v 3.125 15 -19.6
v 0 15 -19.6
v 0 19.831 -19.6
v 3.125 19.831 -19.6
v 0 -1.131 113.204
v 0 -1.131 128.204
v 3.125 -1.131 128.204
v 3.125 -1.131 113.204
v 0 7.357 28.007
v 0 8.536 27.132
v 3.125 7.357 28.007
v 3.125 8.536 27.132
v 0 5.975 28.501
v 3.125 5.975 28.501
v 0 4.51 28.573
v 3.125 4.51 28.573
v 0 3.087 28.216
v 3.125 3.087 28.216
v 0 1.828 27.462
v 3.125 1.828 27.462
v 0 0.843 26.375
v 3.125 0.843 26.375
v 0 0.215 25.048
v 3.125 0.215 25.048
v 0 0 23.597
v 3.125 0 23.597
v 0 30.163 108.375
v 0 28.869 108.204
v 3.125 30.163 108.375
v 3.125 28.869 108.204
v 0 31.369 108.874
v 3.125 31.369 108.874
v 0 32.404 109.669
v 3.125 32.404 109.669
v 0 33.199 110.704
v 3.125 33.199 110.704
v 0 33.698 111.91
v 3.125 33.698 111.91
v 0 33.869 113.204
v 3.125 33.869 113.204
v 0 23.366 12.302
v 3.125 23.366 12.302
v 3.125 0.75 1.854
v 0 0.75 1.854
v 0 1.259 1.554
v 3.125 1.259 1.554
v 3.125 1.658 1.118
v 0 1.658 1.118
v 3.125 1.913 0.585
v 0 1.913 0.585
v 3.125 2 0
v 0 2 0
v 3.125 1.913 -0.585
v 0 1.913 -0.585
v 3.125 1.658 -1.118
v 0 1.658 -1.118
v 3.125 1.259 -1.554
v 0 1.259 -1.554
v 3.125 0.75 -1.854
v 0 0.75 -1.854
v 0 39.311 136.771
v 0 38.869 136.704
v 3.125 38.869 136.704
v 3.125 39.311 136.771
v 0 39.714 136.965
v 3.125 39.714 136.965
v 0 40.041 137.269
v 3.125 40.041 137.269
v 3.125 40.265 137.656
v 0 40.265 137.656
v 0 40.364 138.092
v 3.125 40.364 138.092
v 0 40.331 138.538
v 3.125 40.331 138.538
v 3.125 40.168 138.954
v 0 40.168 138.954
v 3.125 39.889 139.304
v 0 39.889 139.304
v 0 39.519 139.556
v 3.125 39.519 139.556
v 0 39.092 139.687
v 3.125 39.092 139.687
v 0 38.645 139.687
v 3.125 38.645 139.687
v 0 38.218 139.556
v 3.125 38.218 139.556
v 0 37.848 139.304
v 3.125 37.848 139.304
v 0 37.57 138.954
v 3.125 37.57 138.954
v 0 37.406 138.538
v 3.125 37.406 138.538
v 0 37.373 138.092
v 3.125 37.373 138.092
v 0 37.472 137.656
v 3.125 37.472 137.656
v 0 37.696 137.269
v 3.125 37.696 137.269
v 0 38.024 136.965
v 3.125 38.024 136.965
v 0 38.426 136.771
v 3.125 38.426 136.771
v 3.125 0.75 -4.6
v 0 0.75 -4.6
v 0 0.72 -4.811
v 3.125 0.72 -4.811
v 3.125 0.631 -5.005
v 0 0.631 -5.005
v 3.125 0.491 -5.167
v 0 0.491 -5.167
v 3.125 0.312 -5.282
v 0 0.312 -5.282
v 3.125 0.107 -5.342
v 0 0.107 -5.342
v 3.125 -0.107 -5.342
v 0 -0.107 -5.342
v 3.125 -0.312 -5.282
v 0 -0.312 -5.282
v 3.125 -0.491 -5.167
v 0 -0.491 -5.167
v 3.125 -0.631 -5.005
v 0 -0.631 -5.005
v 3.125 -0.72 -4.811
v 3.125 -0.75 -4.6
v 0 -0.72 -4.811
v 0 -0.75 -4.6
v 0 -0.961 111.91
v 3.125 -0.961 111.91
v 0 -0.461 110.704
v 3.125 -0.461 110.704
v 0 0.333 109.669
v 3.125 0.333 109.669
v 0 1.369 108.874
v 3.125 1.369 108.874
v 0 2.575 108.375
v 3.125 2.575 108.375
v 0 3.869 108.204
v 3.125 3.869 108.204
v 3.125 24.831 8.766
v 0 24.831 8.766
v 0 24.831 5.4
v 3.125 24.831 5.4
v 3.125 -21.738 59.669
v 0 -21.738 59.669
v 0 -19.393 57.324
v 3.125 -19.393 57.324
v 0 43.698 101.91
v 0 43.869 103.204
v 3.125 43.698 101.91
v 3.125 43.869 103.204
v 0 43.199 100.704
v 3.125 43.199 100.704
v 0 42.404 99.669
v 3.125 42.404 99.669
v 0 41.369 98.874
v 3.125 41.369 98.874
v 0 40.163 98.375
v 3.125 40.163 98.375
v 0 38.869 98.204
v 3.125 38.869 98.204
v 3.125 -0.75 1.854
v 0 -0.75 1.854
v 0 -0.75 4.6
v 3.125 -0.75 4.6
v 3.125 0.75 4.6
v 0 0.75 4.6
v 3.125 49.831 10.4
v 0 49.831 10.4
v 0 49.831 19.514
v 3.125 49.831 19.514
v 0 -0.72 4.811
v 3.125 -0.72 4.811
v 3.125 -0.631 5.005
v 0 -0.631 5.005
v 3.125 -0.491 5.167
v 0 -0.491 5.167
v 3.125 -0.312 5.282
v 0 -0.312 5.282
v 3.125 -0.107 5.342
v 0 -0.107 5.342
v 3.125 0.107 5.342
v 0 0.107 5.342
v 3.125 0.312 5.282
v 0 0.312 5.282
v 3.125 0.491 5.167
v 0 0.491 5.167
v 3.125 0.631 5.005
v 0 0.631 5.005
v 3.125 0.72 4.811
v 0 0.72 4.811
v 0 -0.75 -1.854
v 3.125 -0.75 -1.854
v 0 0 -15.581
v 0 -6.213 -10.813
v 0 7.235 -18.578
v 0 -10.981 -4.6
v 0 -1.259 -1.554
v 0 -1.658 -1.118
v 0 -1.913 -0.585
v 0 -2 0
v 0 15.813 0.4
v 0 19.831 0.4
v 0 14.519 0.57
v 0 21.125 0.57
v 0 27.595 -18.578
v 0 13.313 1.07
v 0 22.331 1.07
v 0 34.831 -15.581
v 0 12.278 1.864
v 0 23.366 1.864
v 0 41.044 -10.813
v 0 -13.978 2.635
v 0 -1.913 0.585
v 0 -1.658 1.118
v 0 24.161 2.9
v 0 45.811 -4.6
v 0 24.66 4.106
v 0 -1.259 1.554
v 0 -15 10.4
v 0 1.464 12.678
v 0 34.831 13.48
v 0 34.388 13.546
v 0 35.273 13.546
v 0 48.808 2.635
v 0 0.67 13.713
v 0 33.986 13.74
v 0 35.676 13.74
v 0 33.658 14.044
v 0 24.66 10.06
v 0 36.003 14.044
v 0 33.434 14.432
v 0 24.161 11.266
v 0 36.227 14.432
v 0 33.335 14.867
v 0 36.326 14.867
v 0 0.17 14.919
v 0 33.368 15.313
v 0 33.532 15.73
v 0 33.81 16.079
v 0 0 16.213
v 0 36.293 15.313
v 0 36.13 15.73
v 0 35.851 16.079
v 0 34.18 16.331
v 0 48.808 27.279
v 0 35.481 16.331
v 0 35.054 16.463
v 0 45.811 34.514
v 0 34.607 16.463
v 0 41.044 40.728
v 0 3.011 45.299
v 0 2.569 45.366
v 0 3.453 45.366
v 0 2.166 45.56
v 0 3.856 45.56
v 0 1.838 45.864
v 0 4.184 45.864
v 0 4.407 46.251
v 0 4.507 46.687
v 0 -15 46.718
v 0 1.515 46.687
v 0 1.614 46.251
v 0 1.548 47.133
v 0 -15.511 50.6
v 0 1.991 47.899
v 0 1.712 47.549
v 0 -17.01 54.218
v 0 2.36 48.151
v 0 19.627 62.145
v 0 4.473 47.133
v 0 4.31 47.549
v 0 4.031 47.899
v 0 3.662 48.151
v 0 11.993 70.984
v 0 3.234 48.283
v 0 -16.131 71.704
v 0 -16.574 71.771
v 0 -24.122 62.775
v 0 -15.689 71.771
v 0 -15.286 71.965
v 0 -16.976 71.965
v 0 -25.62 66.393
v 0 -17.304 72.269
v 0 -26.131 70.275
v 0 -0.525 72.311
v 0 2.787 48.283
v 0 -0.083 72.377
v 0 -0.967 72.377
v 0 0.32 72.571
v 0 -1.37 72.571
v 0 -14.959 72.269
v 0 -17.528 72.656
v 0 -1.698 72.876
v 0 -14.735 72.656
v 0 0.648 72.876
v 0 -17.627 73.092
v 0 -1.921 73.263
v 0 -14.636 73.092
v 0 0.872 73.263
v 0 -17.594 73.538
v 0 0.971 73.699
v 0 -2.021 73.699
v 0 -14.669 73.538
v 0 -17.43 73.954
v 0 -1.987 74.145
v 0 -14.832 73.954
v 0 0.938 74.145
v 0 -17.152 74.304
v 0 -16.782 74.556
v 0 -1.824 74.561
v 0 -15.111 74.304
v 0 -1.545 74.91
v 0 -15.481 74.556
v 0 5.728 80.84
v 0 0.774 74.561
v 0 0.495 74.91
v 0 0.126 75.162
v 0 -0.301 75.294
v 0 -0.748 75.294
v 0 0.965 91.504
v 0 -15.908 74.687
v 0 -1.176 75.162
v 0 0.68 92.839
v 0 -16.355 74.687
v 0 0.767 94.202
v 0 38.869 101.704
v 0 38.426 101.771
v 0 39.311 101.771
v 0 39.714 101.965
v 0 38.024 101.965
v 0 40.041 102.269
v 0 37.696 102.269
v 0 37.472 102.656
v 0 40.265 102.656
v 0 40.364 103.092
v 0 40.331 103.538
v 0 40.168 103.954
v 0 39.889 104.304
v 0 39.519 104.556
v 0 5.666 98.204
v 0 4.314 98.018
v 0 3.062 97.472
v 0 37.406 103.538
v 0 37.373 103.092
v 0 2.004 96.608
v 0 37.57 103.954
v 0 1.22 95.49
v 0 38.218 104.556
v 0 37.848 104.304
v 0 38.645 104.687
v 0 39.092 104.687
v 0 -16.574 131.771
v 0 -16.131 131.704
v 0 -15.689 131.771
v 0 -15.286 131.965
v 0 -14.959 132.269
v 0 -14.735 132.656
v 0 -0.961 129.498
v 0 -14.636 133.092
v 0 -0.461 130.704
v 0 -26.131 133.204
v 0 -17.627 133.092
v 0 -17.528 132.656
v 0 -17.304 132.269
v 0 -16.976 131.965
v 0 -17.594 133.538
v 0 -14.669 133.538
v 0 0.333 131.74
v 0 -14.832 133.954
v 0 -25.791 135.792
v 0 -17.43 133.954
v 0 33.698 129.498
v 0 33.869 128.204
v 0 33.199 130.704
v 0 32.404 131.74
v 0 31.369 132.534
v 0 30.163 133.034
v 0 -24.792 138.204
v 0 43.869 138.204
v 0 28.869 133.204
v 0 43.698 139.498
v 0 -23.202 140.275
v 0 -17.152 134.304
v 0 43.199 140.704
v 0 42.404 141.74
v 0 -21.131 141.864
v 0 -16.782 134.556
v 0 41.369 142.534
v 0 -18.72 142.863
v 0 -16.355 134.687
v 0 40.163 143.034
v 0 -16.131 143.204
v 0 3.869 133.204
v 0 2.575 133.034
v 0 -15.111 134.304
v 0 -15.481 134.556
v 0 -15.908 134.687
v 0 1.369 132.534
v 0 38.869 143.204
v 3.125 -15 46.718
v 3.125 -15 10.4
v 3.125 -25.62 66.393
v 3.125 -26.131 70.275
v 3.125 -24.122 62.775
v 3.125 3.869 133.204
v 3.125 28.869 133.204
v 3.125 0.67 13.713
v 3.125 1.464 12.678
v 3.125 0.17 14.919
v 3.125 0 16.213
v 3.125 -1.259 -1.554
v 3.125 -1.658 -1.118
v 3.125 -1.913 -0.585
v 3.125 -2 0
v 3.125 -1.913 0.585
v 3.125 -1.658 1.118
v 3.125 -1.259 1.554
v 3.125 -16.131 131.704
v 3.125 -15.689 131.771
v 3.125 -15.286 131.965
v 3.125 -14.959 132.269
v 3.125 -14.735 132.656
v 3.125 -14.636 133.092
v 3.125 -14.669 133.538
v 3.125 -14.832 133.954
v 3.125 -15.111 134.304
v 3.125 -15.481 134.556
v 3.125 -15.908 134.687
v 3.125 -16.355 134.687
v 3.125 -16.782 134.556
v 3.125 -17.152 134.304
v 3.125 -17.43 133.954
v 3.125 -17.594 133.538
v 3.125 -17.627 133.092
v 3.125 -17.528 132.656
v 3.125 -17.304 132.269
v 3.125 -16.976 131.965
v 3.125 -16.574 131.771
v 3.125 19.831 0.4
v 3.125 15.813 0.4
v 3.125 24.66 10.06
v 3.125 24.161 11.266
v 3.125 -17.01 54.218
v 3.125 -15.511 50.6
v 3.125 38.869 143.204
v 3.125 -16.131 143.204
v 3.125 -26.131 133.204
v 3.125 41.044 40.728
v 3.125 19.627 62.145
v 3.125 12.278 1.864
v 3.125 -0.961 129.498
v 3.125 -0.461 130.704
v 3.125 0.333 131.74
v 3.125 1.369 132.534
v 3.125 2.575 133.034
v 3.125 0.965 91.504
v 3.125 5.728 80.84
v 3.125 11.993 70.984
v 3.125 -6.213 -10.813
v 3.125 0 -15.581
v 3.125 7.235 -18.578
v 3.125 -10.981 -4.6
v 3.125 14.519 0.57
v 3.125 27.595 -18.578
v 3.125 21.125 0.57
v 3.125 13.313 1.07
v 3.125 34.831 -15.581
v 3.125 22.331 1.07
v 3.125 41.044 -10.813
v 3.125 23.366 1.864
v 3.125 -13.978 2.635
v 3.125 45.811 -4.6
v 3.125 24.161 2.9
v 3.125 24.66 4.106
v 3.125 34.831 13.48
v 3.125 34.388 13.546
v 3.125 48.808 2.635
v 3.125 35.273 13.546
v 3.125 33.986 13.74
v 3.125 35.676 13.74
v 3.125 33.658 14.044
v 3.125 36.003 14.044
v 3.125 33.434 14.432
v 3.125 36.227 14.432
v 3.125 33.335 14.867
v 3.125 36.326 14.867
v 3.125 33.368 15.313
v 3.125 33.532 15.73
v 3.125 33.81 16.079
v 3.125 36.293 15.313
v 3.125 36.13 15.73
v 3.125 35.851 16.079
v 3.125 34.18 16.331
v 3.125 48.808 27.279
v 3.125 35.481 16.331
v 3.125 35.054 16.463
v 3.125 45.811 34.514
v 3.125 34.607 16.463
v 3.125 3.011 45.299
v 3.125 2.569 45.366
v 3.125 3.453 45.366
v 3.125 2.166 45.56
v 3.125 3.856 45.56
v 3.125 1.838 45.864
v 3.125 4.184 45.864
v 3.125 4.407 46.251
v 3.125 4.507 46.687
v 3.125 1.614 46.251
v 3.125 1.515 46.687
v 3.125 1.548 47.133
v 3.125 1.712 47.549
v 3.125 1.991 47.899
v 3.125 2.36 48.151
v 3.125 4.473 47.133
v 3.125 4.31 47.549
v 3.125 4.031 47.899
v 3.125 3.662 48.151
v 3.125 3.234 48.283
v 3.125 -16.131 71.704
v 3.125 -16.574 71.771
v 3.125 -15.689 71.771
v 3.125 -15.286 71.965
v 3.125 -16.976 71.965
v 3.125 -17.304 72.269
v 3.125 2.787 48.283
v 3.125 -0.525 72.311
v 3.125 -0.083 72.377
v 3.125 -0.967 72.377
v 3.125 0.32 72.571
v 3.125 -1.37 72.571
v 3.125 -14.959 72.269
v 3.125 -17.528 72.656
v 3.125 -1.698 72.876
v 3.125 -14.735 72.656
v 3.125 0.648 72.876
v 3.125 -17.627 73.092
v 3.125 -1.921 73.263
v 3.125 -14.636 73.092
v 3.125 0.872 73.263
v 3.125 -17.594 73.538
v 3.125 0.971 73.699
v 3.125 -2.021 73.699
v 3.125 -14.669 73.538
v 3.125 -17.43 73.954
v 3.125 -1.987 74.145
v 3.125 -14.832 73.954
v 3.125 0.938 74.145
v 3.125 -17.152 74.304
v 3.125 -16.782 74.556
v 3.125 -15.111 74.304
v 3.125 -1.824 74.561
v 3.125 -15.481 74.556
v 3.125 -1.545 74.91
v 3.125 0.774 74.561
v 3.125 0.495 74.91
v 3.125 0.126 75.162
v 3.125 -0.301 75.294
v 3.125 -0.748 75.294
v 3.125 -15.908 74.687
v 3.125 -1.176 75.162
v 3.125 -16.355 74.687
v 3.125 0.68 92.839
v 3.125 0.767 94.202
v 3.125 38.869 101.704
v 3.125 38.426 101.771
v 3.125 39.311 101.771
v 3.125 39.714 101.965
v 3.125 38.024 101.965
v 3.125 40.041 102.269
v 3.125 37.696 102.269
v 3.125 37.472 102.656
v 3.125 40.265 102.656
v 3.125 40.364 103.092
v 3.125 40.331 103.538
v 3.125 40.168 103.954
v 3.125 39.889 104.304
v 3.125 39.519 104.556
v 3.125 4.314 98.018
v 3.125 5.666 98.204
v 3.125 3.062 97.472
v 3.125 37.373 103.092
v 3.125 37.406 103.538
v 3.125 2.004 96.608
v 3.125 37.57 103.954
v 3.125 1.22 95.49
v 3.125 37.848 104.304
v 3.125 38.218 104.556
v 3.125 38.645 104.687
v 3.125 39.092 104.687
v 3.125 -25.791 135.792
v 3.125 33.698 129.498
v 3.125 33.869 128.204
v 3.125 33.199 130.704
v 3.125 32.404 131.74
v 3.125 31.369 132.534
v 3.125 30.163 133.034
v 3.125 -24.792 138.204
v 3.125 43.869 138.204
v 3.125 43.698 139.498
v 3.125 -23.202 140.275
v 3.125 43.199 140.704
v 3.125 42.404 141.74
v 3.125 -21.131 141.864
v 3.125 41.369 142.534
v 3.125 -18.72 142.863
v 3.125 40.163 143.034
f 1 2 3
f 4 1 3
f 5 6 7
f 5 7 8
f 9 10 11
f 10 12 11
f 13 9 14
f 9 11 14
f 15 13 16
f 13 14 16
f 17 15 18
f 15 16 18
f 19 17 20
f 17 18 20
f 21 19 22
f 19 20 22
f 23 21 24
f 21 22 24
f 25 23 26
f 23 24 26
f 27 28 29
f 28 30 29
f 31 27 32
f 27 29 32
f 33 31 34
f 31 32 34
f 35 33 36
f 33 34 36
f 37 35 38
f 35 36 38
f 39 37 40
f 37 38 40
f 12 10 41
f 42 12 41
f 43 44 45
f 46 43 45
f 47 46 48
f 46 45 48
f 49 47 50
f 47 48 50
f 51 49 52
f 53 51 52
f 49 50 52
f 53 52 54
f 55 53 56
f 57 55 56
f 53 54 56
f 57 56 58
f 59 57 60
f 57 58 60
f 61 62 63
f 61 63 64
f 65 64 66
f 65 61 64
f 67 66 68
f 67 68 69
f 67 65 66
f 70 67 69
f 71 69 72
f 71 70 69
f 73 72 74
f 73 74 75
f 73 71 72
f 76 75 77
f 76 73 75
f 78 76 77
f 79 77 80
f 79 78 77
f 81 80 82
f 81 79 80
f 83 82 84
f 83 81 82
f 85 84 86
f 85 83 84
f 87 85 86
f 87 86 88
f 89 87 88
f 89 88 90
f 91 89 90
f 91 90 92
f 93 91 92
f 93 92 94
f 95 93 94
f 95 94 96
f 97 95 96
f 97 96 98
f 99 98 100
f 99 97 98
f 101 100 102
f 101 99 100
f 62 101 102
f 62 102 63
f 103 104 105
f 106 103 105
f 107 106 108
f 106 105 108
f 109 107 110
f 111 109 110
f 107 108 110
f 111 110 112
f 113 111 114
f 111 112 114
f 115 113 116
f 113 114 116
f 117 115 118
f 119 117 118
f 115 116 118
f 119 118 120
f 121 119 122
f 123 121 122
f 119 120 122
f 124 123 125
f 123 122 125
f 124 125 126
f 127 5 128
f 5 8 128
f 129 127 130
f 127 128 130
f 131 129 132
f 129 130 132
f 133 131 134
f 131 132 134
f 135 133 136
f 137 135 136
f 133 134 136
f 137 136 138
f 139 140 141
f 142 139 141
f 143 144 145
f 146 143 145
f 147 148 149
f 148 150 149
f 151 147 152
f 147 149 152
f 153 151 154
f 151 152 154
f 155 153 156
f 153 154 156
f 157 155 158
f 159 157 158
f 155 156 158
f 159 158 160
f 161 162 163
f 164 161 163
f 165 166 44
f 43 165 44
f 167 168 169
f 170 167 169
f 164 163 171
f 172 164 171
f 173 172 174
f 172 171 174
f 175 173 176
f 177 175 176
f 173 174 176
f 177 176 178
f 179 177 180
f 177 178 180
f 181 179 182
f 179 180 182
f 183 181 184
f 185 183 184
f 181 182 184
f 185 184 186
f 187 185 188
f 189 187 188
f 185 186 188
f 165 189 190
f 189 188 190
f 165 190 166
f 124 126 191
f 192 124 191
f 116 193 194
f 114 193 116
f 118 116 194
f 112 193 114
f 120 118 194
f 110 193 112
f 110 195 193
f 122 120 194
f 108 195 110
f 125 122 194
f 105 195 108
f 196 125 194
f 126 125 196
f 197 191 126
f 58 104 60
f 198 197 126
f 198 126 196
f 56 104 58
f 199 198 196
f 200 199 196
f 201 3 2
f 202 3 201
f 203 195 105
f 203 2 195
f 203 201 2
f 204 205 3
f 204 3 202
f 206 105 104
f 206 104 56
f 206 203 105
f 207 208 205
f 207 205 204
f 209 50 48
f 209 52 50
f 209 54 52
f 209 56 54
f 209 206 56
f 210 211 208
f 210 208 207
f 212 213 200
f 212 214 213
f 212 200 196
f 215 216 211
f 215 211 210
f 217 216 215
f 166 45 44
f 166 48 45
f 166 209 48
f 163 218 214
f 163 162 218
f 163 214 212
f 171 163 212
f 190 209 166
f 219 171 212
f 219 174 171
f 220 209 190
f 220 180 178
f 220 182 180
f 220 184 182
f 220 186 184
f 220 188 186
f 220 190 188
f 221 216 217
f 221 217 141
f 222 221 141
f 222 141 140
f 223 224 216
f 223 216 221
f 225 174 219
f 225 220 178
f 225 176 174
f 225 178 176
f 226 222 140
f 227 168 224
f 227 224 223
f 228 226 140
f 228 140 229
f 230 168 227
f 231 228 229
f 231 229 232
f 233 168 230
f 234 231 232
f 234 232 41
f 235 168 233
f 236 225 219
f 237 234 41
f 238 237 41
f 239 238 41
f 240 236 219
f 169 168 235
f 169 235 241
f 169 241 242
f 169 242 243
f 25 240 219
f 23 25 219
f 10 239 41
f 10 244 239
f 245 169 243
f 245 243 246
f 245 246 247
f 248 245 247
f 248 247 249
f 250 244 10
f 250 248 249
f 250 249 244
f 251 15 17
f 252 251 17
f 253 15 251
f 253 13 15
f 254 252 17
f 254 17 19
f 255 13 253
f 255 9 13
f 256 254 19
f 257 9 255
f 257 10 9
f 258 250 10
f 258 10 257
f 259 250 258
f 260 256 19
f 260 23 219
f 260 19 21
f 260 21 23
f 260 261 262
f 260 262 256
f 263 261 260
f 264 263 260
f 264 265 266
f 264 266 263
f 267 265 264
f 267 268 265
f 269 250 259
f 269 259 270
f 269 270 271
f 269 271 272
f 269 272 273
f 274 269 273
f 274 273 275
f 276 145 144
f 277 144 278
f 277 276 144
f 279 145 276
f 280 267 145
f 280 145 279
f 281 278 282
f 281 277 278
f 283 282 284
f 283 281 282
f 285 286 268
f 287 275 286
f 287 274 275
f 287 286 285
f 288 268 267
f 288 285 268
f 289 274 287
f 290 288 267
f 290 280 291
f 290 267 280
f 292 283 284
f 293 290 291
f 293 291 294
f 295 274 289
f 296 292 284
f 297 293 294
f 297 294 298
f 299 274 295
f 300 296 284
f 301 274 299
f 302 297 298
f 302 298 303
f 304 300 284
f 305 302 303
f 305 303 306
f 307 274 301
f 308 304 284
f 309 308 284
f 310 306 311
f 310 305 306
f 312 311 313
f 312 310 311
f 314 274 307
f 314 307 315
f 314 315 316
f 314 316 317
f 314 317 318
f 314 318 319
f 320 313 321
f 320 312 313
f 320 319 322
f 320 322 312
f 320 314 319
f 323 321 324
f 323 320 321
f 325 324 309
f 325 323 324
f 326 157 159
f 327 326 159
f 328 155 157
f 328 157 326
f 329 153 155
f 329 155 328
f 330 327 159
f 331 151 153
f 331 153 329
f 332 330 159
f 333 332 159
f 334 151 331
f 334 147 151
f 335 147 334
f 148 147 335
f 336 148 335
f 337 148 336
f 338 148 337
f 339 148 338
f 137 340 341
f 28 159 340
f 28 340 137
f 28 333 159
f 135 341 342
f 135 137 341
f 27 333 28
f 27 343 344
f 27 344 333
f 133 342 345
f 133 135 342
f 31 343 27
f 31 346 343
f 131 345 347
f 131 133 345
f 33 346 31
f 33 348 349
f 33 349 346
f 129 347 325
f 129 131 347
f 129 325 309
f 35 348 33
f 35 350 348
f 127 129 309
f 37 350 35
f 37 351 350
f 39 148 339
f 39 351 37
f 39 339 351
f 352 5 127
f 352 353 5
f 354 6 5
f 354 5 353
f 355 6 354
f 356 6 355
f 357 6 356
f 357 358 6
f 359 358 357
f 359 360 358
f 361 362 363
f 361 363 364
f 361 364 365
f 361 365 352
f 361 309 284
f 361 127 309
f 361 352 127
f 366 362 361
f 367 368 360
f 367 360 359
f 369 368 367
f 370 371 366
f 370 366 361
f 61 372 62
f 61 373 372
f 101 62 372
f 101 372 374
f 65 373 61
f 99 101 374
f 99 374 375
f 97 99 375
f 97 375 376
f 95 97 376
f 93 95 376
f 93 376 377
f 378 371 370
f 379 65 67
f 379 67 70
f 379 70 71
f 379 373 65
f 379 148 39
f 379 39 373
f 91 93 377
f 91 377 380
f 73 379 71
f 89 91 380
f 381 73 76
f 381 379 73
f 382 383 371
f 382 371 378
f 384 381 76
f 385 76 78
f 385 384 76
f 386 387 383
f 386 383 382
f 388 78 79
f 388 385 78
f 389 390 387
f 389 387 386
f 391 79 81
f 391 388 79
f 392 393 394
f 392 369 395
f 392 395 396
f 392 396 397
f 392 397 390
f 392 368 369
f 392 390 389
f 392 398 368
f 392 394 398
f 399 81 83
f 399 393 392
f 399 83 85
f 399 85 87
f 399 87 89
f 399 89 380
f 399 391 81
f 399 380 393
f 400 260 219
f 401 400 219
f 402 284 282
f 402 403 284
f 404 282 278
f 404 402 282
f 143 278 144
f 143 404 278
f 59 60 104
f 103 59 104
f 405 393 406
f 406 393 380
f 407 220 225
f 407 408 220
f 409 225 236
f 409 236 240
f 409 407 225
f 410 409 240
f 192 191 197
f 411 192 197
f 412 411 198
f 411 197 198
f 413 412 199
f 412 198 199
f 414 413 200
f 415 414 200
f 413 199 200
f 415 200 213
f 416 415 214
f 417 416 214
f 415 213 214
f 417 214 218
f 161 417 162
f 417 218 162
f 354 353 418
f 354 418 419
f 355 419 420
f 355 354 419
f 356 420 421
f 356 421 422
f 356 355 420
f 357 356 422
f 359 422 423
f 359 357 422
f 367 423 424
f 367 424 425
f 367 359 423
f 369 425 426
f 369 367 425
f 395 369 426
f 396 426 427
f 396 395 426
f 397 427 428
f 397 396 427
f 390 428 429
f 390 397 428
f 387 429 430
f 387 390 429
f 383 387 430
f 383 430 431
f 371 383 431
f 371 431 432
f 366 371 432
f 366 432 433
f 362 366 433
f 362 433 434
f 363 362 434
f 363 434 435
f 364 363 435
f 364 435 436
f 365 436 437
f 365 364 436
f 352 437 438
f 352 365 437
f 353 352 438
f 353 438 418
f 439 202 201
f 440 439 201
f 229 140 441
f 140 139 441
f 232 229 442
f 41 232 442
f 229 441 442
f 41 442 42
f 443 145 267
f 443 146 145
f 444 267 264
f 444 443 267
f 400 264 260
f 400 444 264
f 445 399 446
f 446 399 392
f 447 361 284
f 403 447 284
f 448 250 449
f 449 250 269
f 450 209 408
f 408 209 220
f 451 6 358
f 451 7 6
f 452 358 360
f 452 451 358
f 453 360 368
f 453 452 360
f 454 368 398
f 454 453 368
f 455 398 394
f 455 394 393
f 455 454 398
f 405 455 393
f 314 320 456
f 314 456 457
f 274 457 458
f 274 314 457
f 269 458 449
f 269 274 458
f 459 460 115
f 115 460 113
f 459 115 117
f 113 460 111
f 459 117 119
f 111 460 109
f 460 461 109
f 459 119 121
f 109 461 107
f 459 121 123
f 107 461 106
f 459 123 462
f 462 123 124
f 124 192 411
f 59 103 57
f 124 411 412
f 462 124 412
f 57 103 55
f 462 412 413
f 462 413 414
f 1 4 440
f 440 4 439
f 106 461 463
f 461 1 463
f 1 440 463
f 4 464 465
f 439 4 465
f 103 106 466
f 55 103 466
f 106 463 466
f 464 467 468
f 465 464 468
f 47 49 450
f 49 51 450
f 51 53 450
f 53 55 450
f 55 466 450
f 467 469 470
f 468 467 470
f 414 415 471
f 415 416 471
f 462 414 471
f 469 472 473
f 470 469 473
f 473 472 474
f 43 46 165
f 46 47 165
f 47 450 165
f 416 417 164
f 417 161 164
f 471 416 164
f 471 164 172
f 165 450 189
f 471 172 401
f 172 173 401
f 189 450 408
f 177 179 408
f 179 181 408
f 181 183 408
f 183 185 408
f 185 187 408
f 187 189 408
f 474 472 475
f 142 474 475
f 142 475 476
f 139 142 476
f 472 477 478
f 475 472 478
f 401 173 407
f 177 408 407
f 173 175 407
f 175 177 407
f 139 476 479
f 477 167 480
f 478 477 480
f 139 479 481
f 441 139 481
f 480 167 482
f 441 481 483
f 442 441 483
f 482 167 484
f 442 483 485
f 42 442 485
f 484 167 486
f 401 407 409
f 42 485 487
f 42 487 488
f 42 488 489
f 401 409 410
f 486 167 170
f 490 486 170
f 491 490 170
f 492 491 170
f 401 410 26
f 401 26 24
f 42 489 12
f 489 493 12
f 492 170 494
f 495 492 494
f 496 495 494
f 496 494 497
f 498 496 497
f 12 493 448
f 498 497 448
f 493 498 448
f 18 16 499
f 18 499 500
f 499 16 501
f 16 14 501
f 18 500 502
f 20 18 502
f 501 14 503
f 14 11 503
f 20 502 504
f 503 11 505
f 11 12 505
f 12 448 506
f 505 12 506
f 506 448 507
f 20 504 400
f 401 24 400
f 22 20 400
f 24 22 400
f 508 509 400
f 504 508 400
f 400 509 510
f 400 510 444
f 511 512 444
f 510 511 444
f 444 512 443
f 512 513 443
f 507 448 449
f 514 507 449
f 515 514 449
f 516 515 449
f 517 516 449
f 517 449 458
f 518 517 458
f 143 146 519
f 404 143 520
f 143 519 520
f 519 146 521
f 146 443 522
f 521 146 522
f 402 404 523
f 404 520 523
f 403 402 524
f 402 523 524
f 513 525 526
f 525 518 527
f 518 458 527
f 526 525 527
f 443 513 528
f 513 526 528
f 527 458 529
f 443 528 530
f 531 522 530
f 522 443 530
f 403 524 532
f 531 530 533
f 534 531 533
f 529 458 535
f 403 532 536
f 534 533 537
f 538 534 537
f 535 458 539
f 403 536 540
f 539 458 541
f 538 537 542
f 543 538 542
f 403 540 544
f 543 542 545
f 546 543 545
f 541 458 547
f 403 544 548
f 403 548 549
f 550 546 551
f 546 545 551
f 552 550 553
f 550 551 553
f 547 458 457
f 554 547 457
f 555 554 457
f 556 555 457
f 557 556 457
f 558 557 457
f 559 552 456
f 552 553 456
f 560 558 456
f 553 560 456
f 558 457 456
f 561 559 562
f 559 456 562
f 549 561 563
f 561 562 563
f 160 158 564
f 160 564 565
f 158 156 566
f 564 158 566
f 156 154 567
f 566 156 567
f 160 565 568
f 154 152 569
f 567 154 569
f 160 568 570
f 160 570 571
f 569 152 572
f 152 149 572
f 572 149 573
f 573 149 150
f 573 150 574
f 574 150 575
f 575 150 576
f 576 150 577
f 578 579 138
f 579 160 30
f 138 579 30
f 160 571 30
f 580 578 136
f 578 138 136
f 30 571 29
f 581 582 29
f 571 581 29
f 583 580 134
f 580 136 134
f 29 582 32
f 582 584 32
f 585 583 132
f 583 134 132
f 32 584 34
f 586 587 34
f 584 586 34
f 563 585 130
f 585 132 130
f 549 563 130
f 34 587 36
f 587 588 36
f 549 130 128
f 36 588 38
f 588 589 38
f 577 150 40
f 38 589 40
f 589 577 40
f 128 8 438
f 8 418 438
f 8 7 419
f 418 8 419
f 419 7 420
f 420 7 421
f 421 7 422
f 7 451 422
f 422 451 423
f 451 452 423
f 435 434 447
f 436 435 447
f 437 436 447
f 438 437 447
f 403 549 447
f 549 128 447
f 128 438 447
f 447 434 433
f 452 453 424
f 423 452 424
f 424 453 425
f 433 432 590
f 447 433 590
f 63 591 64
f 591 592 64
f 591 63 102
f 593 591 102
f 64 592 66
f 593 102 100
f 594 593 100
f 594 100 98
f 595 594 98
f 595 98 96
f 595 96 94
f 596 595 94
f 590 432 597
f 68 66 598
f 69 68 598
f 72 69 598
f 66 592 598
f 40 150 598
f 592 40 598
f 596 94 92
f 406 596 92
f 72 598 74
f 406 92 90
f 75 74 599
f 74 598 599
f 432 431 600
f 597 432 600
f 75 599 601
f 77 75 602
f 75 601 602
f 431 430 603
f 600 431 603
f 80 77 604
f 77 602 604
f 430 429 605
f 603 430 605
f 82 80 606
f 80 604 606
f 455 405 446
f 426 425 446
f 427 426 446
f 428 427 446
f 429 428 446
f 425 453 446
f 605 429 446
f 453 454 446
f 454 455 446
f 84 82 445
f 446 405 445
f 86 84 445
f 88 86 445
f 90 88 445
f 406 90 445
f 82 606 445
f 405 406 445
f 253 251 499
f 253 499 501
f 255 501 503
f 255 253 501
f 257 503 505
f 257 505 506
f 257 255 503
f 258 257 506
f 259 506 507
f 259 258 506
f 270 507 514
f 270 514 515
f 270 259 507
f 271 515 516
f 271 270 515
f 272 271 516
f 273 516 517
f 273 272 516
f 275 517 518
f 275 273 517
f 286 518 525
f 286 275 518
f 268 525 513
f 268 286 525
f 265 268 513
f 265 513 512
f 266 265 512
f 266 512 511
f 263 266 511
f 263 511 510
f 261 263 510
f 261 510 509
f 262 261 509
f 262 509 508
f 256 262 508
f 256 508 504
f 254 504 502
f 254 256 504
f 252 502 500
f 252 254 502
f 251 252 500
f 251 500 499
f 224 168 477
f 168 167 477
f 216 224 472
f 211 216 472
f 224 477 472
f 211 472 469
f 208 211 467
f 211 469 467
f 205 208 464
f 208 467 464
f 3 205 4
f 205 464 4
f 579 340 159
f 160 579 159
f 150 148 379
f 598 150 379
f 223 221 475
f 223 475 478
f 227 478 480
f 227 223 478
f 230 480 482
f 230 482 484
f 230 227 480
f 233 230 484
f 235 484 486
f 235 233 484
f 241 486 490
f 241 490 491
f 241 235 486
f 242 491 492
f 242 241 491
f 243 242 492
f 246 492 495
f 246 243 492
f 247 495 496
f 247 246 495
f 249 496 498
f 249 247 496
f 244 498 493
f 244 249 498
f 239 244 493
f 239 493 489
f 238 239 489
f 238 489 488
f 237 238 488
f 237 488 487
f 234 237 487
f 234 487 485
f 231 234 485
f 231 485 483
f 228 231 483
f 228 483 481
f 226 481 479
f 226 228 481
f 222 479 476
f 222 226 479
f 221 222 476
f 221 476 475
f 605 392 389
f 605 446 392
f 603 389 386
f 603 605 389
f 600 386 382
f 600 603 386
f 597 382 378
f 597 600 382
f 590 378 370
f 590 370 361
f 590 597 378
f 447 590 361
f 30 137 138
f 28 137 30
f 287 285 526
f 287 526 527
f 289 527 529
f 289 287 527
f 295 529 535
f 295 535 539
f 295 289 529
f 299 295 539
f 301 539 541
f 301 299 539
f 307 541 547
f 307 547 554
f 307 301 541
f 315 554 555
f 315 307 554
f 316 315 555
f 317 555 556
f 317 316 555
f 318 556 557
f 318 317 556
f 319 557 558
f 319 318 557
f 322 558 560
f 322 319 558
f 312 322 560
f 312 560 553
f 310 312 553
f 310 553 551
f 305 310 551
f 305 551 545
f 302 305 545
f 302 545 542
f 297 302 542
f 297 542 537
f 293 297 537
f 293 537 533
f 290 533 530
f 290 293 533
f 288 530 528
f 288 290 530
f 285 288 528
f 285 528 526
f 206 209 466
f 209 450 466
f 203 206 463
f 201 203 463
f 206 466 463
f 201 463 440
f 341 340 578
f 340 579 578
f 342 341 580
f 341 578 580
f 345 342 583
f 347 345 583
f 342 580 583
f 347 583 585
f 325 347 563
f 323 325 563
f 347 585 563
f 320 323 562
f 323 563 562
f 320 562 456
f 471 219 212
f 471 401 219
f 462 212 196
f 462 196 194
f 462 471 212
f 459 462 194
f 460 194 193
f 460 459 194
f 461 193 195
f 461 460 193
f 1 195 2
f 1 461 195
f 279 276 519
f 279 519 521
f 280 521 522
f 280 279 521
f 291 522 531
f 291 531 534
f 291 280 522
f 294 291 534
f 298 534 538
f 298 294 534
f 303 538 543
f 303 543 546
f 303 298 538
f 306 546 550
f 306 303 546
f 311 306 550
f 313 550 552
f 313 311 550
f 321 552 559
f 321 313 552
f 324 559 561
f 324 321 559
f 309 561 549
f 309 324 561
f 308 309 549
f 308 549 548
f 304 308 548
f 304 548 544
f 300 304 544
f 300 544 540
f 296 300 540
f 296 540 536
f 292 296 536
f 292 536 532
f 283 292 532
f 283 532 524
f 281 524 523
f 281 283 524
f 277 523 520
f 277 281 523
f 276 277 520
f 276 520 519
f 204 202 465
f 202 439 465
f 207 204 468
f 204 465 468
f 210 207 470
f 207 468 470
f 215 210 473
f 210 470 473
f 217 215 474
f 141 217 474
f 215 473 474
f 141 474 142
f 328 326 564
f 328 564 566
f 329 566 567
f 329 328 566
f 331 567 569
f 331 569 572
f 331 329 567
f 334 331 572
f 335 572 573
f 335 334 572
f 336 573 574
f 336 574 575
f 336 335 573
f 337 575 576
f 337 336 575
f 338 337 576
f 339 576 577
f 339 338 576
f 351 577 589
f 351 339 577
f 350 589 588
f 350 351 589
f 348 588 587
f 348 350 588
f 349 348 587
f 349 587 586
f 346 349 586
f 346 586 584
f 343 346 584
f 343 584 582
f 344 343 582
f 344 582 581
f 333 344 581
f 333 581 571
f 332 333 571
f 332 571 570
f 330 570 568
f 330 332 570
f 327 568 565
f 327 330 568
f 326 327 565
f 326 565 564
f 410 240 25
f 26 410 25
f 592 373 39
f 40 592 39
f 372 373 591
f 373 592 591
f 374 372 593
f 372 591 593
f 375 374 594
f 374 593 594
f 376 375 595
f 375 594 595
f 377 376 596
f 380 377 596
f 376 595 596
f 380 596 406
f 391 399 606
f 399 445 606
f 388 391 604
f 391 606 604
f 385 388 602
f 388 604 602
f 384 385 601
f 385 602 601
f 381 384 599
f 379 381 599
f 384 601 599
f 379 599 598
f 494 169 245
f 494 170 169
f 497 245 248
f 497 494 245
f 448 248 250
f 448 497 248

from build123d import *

# Parameters (mm, degrees)
SKETCH1_R           = 1.5
SKETCH1_W           = 25
SKETCH1_H           = 35
BOSS_EXTRUDE1_DEPTH = 3.125
FILLET2_R           = 15
FILLET3_R           = 30
FILLET4_R           = 30
FILLET5_R           = 80
FILLET6_R           = 30
FILLET7_R           = 5
FILLET1_R           = 10
FILLET8_R           = 5


with BuildPart() as part:
    # Sketch1 → Boss-Extrude1 (new body)
    with BuildSketch(Plane(origin=(0, 0, 0), x_dir=(0, 0, -1), z_dir=(1, 0, 0))):
        Polygon((-143.20422433, -1.13137085), (-143.20422433, -26.13137085), (-64.062088707, -26.13137085), (-52.930717857, -15), (19.6, -15), (19.6, 49.830569927), (-31.940768363, 49.830569927), (-82.90270914, -1.13137085), (-98.20422433, -1.13137085), (-98.20422433, 43.86862915), (-143.20422433, 43.86862915), align=None)
        with Locations((-46.799347007, 3.010764774)):
            Circle(SKETCH1_R, mode=Mode.SUBTRACT)
        with Locations((-14.979541854, 34.830569927)):
            Circle(SKETCH1_R, mode=Mode.SUBTRACT)
        with Locations((-73.810826048, -0.524769132)):
            Circle(SKETCH1_R, mode=Mode.SUBTRACT)
        with Locations((-73.20422433, -16.13137085)):
            Circle(SKETCH1_R, mode=Mode.SUBTRACT)
        with Locations((-133.20422433, -16.13137085)):
            Circle(SKETCH1_R, mode=Mode.SUBTRACT)
        with Locations((-138.20422433, 38.86862915)):
            Circle(SKETCH1_R, mode=Mode.SUBTRACT)
        with Locations((-103.20422433, 38.86862915)):
            Circle(SKETCH1_R, mode=Mode.SUBTRACT)
        with BuildLine():
            Line((-4.6, 0.75), (-1.854049622, 0.75))
            ThreePointArc((-1.854049622, 0.75), (0, 2), (1.854049622, 0.75))
            Line((1.854049622, 0.75), (4.6, 0.75))
            ThreePointArc((4.6, 0.75), (5.35, 0), (4.6, -0.75))
            Line((4.6, -0.75), (1.854049622, -0.75))
            ThreePointArc((1.854049622, -0.75), (0, -2), (-1.854049622, -0.75))
            Line((-1.854049622, -0.75), (-4.6, -0.75))
            ThreePointArc((-4.6, -0.75), (-5.35, 0), (-4.6, 0.75))
        make_face(mode=Mode.SUBTRACT)
        Polygon((-35.667976157, 0), (-10.83740623, 24.830569927), (-0.4, 24.830569927), (-0.4, 13.742135624), (-14.142135624, 0), align=None, mode=Mode.SUBTRACT)
        with Locations((-120.70422433, 16.36862915)):
            Rectangle(SKETCH1_W, SKETCH1_H, mode=Mode.SUBTRACT)
    extrude(amount=BOSS_EXTRUDE1_DEPTH)

    # Fillet2
    fillet2_edges = [part.edges().sort_by_distance(p)[0] for p in [
        (1.5625, -15, 52.930717857),
        (1.5625, -26.13137085, 64.062088707),
    ]]
    fillet(fillet2_edges, radius=FILLET2_R)

    # Fillet3
    fillet3_edges = [part.edges().sort_by_distance(p)[0] for p in [
        (1.5625, -15, -19.6),
    ]]
    fillet(fillet3_edges, radius=FILLET3_R)

    # Fillet4
    fillet4_edges = [part.edges().sort_by_distance(p)[0] for p in [
        (1.5625, 49.830569927, 31.940768363),
    ]]
    fillet(fillet4_edges, radius=FILLET4_R)

    # Fillet5
    # the kernel refuses this fillet: 80 mm, written as the material it adds along each edge
    with BuildSketch(Plane(origin=(0, -1.13137085, 82.90270914), x_dir=(0, 0.7071067811865434, -0.7071067811865517), z_dir=(1, 0, 0))) as fillet5_piece_1:
        with BuildLine():
            CenterArc((29.356066225, 80), FILLET5_R, 239.854448647, 30.145551353)
            Line((-10.819805153, 10.819805153), (-11.623322581, 9.436201256))
            ThreePointArc((-11.623322581, 9.436201256), (-6.541273427, 4.278531727), (-1.13137085, -1.13137085))
            Line((-1.13137085, -1.13137085), (0, -1.6))
            Line((0, -1.6), (29.356066225, -1.6))
            Line((29.356066225, -1.6), (29.356066225, 0))
        make_face()
    extrude(amount=3.125)

    # Fillet6
    fillet6_edges = [part.edges().sort_by_distance(p)[0] for p in [
        (1.5625, 49.830569927, -19.6),
    ]]
    fillet(fillet6_edges, radius=FILLET6_R)

    # Fillet7
    fillet7_edges = [part.edges().sort_by_distance(p)[0] for p in [
        (1.5625, 13.742135624, 0.4),
        (1.5625, 24.830569927, 0.4),
        (1.5625, 24.830569927, 10.83740623),
        (1.5625, 0, 35.667976157),
        (1.5625, 0, 14.142135624),
    ]]
    fillet(fillet7_edges, radius=FILLET7_R)

    # Fillet1
    fillet1_edges = [part.edges().sort_by_distance(p)[0] for p in [
        (1.5625, -26.13137085, 143.20422433),
    ]]
    fillet(fillet1_edges, radius=FILLET1_R)

    # Fillet8
    fillet8_edges = [part.edges().sort_by_distance(p)[0] for p in [
        (1.5625, 43.86862915, 143.20422433),
        (1.5625, 43.86862915, 98.20422433),
        (1.5625, -1.13137085, 98.20422433),
        (1.5625, 33.86862915, 133.20422433),
        (1.5625, -1.13137085, 133.20422433),
        (1.5625, -1.13137085, 108.20422433),
        (1.5625, 33.86862915, 108.20422433),
    ]]
    fillet(fillet8_edges, radius=FILLET8_R)


solid = part.part
